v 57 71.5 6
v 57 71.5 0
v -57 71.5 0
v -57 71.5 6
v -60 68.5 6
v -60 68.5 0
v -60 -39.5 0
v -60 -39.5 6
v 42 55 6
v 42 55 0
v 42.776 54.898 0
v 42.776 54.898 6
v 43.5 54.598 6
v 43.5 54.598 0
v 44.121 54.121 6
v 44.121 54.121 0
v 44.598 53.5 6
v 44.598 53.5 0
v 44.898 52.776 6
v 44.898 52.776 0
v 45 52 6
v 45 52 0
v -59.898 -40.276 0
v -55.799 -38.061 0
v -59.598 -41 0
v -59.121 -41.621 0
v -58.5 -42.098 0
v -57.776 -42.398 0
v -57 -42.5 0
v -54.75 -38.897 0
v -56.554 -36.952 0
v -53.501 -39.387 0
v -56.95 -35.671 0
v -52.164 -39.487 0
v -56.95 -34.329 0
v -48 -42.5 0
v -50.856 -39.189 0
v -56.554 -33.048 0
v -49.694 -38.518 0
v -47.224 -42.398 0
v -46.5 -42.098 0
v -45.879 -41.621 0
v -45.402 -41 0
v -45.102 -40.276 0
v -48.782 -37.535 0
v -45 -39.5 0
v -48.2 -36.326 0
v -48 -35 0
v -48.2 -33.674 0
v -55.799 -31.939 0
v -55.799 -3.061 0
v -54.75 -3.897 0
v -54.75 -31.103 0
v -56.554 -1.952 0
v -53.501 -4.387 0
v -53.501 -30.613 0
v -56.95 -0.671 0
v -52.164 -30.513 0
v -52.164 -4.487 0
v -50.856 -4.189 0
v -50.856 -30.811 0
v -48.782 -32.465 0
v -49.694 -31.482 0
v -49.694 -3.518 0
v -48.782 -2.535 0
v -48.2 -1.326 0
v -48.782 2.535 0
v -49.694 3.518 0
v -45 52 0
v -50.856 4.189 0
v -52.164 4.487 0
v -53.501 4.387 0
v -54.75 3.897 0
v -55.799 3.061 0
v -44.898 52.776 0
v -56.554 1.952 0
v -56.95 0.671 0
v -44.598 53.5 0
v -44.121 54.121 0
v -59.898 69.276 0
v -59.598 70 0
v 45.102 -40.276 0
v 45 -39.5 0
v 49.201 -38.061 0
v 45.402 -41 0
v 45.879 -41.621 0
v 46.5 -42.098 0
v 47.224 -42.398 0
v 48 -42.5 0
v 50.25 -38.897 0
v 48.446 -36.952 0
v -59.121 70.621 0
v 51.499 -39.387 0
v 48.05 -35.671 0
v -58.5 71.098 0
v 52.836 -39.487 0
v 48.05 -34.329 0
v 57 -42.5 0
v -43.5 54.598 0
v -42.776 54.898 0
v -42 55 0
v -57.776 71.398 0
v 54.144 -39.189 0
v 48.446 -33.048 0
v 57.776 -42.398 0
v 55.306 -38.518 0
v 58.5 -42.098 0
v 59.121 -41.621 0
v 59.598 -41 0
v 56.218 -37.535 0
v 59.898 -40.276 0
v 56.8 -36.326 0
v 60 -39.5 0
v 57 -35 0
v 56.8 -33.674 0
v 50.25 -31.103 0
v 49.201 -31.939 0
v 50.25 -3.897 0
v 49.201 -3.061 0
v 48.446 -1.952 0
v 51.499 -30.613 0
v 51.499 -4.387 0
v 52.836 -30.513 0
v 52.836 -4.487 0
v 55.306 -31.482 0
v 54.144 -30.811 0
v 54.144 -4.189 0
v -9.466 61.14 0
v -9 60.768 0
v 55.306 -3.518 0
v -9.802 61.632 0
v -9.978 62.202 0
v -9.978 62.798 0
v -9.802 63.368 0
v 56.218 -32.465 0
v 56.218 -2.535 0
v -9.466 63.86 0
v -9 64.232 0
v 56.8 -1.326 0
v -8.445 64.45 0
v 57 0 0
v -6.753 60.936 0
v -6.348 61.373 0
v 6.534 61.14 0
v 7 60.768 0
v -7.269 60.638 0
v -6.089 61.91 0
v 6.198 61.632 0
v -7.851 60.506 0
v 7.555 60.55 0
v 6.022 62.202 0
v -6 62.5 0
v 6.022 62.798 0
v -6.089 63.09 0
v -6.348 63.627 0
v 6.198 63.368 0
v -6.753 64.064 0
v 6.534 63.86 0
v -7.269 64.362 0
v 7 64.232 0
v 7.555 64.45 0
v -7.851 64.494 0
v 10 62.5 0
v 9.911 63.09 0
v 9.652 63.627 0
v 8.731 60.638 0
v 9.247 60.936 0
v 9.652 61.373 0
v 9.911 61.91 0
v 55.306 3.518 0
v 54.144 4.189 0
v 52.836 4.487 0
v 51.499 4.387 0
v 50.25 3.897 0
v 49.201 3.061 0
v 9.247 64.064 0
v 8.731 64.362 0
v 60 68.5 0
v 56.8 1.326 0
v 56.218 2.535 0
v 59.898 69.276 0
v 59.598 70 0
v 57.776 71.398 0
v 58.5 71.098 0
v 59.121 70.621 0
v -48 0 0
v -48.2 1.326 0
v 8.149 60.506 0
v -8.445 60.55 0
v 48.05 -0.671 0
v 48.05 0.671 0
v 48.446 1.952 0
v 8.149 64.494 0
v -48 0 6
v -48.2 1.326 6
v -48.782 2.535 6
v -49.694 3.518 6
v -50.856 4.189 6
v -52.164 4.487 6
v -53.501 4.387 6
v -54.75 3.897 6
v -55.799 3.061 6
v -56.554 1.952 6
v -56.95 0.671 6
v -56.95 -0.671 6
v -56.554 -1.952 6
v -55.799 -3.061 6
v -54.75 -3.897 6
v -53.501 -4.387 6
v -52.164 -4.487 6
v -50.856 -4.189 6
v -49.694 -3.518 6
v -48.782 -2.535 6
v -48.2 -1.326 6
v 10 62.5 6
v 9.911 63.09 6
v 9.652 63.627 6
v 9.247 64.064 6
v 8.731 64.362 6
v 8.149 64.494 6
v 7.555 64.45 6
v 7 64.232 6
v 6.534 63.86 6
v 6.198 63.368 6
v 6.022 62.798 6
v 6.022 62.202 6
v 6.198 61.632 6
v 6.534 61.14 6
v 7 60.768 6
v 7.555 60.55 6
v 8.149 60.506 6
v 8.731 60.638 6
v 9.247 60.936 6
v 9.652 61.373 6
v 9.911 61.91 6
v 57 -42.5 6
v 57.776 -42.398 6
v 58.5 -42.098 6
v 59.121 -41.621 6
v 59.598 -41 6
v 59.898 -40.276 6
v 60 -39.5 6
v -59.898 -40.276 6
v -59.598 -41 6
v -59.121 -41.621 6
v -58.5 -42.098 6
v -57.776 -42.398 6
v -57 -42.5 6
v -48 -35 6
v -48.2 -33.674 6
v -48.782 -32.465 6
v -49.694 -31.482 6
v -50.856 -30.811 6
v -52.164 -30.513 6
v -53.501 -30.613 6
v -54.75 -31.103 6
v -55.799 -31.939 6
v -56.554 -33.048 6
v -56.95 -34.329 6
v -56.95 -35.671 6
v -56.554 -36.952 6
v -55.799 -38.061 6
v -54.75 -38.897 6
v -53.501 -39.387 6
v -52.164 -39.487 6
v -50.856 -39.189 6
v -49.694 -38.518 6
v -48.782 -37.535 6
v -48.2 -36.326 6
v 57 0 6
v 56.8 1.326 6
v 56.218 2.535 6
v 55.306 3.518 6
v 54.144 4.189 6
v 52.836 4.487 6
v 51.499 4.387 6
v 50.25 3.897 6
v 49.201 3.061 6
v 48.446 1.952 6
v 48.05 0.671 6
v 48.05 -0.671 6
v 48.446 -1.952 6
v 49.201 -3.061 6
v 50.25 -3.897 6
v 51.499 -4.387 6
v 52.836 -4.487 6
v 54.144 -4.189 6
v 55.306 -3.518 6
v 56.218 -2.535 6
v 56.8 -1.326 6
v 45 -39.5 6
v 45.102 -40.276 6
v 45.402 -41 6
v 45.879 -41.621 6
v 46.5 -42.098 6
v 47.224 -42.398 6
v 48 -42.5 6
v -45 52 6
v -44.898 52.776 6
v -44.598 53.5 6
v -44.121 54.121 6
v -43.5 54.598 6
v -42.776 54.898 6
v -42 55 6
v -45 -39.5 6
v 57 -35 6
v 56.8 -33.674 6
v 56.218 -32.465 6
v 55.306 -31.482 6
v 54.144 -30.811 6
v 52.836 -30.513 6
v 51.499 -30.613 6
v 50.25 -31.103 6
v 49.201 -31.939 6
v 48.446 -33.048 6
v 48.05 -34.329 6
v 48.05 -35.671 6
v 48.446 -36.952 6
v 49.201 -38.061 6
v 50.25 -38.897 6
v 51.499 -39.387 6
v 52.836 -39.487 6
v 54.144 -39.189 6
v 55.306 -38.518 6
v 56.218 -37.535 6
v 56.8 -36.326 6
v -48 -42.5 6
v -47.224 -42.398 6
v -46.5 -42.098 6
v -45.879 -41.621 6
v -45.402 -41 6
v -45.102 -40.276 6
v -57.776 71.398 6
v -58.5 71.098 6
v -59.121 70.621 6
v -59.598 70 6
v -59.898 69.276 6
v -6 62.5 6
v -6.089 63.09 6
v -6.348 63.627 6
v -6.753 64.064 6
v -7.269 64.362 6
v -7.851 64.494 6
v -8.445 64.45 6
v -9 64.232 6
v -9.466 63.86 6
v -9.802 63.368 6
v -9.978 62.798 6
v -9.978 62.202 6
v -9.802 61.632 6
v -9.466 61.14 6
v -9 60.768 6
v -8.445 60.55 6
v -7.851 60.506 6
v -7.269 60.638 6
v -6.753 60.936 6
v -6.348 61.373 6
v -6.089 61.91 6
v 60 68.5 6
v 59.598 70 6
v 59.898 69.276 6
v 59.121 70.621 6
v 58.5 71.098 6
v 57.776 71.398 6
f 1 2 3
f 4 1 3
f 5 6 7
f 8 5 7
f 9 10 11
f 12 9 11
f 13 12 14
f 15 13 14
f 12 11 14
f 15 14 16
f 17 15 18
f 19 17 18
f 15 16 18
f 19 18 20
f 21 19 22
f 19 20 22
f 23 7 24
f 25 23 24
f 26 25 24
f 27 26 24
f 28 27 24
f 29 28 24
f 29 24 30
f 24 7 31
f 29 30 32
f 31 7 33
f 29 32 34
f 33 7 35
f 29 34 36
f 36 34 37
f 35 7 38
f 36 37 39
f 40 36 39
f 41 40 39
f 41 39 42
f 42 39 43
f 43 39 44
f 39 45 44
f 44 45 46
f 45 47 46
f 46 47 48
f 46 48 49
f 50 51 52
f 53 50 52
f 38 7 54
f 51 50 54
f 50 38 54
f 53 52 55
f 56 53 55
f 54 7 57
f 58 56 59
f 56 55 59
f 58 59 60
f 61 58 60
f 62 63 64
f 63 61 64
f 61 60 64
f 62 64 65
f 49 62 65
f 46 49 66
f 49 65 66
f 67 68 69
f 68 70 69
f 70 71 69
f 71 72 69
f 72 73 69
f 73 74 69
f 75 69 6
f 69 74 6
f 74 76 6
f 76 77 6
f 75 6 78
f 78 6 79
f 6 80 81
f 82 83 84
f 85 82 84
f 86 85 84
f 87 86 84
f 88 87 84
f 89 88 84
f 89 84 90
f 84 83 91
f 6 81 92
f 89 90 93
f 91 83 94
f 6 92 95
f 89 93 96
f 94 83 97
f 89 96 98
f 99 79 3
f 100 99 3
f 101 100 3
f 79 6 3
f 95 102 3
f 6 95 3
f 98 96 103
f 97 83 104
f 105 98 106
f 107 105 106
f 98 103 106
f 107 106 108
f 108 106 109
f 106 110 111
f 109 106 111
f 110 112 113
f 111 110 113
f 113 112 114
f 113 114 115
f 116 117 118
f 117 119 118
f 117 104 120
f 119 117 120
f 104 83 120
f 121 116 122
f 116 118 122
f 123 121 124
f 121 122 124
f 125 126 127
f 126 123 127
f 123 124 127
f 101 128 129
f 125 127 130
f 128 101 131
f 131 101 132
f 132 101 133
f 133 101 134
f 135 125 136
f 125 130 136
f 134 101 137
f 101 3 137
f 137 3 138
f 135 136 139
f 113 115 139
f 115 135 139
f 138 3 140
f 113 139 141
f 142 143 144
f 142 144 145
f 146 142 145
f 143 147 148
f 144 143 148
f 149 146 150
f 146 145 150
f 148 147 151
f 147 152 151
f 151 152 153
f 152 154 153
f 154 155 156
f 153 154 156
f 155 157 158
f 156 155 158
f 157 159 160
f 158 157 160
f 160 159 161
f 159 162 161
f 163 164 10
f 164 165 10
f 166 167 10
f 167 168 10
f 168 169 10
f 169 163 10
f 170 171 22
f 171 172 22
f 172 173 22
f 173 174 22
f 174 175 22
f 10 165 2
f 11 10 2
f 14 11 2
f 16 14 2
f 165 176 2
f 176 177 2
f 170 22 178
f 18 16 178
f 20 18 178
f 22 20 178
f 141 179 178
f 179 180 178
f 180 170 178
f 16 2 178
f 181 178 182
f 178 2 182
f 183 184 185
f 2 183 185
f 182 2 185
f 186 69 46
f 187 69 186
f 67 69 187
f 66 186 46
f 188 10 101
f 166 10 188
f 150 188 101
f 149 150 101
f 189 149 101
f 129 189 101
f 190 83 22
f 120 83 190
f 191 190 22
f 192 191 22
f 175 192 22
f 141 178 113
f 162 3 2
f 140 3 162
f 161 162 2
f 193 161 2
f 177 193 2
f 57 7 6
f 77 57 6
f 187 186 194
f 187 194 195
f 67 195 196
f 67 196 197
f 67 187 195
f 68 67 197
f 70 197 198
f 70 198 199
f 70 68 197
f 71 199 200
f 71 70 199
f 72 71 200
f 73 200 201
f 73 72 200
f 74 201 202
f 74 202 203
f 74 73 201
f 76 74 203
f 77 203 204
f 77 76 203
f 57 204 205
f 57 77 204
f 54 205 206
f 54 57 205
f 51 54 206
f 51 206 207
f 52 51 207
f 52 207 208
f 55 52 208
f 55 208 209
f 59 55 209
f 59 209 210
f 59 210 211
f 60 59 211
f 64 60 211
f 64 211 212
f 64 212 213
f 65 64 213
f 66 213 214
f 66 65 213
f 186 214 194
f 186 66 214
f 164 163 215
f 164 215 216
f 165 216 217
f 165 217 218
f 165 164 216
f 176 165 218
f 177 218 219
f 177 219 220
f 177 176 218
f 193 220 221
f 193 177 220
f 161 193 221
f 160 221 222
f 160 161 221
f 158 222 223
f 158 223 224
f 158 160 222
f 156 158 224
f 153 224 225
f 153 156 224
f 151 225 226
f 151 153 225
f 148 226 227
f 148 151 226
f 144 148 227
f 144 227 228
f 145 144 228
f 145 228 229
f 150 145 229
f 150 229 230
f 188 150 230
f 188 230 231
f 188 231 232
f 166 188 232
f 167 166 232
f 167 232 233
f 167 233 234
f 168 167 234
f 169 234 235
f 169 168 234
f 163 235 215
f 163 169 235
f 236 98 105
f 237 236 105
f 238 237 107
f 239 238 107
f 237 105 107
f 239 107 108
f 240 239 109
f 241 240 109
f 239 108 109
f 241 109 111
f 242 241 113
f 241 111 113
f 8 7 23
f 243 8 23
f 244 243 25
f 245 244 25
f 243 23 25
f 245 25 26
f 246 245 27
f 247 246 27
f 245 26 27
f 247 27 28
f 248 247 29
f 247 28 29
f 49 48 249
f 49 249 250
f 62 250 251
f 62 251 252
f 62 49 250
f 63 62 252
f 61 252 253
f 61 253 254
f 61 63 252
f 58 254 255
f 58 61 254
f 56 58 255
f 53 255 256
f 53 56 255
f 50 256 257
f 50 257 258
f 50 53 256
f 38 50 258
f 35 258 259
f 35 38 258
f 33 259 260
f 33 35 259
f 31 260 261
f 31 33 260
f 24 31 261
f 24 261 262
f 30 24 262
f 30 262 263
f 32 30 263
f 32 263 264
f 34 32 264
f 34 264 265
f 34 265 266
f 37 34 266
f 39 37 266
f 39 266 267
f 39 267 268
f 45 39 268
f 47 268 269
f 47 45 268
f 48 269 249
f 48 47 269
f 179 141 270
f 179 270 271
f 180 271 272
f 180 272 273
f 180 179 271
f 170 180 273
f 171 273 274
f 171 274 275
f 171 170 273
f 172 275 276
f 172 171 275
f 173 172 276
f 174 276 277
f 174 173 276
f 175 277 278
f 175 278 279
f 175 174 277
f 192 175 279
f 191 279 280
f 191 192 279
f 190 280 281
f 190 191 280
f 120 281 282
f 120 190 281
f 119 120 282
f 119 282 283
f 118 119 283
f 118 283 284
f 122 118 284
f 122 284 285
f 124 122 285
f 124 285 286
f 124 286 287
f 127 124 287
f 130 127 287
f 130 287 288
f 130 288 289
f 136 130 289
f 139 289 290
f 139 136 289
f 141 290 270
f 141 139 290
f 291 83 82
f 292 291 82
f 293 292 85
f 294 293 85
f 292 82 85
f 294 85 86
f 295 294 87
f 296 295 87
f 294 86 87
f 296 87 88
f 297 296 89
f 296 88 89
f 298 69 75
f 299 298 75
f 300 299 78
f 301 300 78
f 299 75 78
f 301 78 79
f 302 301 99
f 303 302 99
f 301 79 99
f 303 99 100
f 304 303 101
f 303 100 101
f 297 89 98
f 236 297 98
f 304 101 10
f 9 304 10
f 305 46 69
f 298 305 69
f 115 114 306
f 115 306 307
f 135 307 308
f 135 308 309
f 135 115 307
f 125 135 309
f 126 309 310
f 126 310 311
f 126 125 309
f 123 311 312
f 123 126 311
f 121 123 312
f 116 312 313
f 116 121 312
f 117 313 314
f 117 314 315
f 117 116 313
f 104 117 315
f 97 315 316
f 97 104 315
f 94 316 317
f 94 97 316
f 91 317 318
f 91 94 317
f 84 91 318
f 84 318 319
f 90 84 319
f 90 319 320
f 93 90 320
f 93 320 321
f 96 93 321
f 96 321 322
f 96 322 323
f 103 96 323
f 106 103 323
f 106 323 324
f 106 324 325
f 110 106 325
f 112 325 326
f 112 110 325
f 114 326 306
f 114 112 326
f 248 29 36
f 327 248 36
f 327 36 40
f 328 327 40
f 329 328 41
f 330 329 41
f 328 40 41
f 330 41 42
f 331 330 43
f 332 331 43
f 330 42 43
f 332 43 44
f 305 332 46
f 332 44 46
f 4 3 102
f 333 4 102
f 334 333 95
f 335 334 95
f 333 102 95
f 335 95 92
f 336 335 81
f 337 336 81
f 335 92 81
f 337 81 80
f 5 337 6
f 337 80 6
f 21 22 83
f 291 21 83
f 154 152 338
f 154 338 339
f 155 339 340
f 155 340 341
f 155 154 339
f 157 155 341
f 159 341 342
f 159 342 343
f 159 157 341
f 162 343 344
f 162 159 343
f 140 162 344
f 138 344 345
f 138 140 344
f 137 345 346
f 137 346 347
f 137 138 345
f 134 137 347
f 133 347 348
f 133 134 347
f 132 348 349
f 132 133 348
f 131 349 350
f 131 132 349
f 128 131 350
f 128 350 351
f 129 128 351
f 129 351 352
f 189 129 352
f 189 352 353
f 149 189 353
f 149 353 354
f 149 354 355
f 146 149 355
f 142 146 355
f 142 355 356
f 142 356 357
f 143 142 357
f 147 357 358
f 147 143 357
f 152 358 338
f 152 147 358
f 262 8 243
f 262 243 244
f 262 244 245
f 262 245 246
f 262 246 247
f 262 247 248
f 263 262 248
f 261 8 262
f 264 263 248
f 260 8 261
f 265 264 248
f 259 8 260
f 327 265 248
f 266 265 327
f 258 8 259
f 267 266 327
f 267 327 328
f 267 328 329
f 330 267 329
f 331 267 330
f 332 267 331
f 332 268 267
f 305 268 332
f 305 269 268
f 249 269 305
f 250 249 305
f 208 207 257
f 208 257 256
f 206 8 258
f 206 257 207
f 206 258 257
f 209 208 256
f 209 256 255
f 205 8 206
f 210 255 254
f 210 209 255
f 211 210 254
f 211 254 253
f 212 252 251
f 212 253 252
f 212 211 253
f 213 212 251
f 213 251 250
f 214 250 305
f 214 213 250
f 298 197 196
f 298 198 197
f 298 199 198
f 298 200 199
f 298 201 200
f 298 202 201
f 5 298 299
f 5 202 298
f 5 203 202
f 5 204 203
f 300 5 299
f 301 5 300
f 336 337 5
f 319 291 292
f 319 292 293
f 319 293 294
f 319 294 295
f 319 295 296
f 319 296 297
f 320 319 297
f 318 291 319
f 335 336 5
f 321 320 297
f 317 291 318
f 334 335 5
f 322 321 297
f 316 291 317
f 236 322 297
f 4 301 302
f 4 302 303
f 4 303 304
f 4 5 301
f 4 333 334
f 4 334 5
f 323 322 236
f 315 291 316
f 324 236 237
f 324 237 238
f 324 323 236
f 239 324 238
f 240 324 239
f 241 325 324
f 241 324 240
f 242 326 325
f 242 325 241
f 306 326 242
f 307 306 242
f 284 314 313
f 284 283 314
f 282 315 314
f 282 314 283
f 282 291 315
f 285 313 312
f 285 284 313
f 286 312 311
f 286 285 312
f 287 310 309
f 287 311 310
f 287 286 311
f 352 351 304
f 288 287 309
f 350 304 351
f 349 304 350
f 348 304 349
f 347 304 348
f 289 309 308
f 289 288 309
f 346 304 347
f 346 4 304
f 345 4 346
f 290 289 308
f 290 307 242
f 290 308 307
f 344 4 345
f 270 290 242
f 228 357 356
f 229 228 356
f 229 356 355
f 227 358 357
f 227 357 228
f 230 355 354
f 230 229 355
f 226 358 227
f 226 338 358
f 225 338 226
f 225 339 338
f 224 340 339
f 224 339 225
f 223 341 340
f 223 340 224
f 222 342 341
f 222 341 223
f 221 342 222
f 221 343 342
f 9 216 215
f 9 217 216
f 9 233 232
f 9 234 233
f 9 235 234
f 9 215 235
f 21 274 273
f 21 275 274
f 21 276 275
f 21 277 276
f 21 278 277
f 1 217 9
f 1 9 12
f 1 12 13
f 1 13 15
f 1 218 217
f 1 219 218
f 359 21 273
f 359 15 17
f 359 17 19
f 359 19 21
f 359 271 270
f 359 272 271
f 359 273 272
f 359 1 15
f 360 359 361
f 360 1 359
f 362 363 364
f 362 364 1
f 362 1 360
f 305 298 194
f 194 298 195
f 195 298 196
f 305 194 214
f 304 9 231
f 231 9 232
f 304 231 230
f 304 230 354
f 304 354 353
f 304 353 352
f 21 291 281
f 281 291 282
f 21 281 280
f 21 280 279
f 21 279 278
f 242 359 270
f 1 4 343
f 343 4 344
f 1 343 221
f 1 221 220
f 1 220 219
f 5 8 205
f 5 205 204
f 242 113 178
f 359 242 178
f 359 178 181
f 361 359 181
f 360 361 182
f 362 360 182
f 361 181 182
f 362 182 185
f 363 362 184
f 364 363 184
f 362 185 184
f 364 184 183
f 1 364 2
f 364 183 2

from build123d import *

# Parameters (mm, degrees)
SKETCH1_R           = 2
SKETCH1_R_2         = 4.5
BOSS_EXTRUDE1_DEPTH = 6


with BuildPart() as part:
    # Sketch1 → Boss-Extrude1 (new body)
    with BuildSketch(Plane.XY):
        with BuildLine():
            Line((-45, -39.5), (-45, 52))
            ThreePointArc((-45, 52), (-44.121320344, 54.121320344), (-42, 55))
            Line((-42, 55), (42, 55))
            ThreePointArc((42, 55), (44.121320344, 54.121320344), (45, 52))
            Line((45, 52), (45, -39.5))
            ThreePointArc((45, -39.5), (45.878679656, -41.621320344), (48, -42.5))
            Line((48, -42.5), (57, -42.5))
            ThreePointArc((57, -42.5), (59.121320344, -41.621320344), (60, -39.5))
            Line((60, -39.5), (60, 68.5))
            ThreePointArc((60, 68.5), (59.121320344, 70.621320344), (57, 71.5))
            Line((57, 71.5), (-57, 71.5))
            ThreePointArc((-57, 71.5), (-59.121320344, 70.621320344), (-60, 68.5))
            Line((-60, 68.5), (-60, -39.5))
            ThreePointArc((-60, -39.5), (-59.121320344, -41.621320344), (-57, -42.5))
            Line((-57, -42.5), (-48, -42.5))
            ThreePointArc((-48, -42.5), (-45.878679656, -41.621320344), (-45, -39.5))
        make_face()
        with Locations((8, 62.5)):
            Circle(SKETCH1_R, mode=Mode.SUBTRACT)
        with Locations((-8, 62.5)):
            Circle(SKETCH1_R, mode=Mode.SUBTRACT)
        with Locations((-52.5, -35)):
            Circle(SKETCH1_R_2, mode=Mode.SUBTRACT)
        with Locations((52.5, -35)):
            Circle(SKETCH1_R_2, mode=Mode.SUBTRACT)
        with Locations((-52.5, 0)):
            Circle(SKETCH1_R_2, mode=Mode.SUBTRACT)
        with Locations((52.5, 0)):
            Circle(SKETCH1_R_2, mode=Mode.SUBTRACT)
    extrude(amount=BOSS_EXTRUDE1_DEPTH)


solid = part.part
